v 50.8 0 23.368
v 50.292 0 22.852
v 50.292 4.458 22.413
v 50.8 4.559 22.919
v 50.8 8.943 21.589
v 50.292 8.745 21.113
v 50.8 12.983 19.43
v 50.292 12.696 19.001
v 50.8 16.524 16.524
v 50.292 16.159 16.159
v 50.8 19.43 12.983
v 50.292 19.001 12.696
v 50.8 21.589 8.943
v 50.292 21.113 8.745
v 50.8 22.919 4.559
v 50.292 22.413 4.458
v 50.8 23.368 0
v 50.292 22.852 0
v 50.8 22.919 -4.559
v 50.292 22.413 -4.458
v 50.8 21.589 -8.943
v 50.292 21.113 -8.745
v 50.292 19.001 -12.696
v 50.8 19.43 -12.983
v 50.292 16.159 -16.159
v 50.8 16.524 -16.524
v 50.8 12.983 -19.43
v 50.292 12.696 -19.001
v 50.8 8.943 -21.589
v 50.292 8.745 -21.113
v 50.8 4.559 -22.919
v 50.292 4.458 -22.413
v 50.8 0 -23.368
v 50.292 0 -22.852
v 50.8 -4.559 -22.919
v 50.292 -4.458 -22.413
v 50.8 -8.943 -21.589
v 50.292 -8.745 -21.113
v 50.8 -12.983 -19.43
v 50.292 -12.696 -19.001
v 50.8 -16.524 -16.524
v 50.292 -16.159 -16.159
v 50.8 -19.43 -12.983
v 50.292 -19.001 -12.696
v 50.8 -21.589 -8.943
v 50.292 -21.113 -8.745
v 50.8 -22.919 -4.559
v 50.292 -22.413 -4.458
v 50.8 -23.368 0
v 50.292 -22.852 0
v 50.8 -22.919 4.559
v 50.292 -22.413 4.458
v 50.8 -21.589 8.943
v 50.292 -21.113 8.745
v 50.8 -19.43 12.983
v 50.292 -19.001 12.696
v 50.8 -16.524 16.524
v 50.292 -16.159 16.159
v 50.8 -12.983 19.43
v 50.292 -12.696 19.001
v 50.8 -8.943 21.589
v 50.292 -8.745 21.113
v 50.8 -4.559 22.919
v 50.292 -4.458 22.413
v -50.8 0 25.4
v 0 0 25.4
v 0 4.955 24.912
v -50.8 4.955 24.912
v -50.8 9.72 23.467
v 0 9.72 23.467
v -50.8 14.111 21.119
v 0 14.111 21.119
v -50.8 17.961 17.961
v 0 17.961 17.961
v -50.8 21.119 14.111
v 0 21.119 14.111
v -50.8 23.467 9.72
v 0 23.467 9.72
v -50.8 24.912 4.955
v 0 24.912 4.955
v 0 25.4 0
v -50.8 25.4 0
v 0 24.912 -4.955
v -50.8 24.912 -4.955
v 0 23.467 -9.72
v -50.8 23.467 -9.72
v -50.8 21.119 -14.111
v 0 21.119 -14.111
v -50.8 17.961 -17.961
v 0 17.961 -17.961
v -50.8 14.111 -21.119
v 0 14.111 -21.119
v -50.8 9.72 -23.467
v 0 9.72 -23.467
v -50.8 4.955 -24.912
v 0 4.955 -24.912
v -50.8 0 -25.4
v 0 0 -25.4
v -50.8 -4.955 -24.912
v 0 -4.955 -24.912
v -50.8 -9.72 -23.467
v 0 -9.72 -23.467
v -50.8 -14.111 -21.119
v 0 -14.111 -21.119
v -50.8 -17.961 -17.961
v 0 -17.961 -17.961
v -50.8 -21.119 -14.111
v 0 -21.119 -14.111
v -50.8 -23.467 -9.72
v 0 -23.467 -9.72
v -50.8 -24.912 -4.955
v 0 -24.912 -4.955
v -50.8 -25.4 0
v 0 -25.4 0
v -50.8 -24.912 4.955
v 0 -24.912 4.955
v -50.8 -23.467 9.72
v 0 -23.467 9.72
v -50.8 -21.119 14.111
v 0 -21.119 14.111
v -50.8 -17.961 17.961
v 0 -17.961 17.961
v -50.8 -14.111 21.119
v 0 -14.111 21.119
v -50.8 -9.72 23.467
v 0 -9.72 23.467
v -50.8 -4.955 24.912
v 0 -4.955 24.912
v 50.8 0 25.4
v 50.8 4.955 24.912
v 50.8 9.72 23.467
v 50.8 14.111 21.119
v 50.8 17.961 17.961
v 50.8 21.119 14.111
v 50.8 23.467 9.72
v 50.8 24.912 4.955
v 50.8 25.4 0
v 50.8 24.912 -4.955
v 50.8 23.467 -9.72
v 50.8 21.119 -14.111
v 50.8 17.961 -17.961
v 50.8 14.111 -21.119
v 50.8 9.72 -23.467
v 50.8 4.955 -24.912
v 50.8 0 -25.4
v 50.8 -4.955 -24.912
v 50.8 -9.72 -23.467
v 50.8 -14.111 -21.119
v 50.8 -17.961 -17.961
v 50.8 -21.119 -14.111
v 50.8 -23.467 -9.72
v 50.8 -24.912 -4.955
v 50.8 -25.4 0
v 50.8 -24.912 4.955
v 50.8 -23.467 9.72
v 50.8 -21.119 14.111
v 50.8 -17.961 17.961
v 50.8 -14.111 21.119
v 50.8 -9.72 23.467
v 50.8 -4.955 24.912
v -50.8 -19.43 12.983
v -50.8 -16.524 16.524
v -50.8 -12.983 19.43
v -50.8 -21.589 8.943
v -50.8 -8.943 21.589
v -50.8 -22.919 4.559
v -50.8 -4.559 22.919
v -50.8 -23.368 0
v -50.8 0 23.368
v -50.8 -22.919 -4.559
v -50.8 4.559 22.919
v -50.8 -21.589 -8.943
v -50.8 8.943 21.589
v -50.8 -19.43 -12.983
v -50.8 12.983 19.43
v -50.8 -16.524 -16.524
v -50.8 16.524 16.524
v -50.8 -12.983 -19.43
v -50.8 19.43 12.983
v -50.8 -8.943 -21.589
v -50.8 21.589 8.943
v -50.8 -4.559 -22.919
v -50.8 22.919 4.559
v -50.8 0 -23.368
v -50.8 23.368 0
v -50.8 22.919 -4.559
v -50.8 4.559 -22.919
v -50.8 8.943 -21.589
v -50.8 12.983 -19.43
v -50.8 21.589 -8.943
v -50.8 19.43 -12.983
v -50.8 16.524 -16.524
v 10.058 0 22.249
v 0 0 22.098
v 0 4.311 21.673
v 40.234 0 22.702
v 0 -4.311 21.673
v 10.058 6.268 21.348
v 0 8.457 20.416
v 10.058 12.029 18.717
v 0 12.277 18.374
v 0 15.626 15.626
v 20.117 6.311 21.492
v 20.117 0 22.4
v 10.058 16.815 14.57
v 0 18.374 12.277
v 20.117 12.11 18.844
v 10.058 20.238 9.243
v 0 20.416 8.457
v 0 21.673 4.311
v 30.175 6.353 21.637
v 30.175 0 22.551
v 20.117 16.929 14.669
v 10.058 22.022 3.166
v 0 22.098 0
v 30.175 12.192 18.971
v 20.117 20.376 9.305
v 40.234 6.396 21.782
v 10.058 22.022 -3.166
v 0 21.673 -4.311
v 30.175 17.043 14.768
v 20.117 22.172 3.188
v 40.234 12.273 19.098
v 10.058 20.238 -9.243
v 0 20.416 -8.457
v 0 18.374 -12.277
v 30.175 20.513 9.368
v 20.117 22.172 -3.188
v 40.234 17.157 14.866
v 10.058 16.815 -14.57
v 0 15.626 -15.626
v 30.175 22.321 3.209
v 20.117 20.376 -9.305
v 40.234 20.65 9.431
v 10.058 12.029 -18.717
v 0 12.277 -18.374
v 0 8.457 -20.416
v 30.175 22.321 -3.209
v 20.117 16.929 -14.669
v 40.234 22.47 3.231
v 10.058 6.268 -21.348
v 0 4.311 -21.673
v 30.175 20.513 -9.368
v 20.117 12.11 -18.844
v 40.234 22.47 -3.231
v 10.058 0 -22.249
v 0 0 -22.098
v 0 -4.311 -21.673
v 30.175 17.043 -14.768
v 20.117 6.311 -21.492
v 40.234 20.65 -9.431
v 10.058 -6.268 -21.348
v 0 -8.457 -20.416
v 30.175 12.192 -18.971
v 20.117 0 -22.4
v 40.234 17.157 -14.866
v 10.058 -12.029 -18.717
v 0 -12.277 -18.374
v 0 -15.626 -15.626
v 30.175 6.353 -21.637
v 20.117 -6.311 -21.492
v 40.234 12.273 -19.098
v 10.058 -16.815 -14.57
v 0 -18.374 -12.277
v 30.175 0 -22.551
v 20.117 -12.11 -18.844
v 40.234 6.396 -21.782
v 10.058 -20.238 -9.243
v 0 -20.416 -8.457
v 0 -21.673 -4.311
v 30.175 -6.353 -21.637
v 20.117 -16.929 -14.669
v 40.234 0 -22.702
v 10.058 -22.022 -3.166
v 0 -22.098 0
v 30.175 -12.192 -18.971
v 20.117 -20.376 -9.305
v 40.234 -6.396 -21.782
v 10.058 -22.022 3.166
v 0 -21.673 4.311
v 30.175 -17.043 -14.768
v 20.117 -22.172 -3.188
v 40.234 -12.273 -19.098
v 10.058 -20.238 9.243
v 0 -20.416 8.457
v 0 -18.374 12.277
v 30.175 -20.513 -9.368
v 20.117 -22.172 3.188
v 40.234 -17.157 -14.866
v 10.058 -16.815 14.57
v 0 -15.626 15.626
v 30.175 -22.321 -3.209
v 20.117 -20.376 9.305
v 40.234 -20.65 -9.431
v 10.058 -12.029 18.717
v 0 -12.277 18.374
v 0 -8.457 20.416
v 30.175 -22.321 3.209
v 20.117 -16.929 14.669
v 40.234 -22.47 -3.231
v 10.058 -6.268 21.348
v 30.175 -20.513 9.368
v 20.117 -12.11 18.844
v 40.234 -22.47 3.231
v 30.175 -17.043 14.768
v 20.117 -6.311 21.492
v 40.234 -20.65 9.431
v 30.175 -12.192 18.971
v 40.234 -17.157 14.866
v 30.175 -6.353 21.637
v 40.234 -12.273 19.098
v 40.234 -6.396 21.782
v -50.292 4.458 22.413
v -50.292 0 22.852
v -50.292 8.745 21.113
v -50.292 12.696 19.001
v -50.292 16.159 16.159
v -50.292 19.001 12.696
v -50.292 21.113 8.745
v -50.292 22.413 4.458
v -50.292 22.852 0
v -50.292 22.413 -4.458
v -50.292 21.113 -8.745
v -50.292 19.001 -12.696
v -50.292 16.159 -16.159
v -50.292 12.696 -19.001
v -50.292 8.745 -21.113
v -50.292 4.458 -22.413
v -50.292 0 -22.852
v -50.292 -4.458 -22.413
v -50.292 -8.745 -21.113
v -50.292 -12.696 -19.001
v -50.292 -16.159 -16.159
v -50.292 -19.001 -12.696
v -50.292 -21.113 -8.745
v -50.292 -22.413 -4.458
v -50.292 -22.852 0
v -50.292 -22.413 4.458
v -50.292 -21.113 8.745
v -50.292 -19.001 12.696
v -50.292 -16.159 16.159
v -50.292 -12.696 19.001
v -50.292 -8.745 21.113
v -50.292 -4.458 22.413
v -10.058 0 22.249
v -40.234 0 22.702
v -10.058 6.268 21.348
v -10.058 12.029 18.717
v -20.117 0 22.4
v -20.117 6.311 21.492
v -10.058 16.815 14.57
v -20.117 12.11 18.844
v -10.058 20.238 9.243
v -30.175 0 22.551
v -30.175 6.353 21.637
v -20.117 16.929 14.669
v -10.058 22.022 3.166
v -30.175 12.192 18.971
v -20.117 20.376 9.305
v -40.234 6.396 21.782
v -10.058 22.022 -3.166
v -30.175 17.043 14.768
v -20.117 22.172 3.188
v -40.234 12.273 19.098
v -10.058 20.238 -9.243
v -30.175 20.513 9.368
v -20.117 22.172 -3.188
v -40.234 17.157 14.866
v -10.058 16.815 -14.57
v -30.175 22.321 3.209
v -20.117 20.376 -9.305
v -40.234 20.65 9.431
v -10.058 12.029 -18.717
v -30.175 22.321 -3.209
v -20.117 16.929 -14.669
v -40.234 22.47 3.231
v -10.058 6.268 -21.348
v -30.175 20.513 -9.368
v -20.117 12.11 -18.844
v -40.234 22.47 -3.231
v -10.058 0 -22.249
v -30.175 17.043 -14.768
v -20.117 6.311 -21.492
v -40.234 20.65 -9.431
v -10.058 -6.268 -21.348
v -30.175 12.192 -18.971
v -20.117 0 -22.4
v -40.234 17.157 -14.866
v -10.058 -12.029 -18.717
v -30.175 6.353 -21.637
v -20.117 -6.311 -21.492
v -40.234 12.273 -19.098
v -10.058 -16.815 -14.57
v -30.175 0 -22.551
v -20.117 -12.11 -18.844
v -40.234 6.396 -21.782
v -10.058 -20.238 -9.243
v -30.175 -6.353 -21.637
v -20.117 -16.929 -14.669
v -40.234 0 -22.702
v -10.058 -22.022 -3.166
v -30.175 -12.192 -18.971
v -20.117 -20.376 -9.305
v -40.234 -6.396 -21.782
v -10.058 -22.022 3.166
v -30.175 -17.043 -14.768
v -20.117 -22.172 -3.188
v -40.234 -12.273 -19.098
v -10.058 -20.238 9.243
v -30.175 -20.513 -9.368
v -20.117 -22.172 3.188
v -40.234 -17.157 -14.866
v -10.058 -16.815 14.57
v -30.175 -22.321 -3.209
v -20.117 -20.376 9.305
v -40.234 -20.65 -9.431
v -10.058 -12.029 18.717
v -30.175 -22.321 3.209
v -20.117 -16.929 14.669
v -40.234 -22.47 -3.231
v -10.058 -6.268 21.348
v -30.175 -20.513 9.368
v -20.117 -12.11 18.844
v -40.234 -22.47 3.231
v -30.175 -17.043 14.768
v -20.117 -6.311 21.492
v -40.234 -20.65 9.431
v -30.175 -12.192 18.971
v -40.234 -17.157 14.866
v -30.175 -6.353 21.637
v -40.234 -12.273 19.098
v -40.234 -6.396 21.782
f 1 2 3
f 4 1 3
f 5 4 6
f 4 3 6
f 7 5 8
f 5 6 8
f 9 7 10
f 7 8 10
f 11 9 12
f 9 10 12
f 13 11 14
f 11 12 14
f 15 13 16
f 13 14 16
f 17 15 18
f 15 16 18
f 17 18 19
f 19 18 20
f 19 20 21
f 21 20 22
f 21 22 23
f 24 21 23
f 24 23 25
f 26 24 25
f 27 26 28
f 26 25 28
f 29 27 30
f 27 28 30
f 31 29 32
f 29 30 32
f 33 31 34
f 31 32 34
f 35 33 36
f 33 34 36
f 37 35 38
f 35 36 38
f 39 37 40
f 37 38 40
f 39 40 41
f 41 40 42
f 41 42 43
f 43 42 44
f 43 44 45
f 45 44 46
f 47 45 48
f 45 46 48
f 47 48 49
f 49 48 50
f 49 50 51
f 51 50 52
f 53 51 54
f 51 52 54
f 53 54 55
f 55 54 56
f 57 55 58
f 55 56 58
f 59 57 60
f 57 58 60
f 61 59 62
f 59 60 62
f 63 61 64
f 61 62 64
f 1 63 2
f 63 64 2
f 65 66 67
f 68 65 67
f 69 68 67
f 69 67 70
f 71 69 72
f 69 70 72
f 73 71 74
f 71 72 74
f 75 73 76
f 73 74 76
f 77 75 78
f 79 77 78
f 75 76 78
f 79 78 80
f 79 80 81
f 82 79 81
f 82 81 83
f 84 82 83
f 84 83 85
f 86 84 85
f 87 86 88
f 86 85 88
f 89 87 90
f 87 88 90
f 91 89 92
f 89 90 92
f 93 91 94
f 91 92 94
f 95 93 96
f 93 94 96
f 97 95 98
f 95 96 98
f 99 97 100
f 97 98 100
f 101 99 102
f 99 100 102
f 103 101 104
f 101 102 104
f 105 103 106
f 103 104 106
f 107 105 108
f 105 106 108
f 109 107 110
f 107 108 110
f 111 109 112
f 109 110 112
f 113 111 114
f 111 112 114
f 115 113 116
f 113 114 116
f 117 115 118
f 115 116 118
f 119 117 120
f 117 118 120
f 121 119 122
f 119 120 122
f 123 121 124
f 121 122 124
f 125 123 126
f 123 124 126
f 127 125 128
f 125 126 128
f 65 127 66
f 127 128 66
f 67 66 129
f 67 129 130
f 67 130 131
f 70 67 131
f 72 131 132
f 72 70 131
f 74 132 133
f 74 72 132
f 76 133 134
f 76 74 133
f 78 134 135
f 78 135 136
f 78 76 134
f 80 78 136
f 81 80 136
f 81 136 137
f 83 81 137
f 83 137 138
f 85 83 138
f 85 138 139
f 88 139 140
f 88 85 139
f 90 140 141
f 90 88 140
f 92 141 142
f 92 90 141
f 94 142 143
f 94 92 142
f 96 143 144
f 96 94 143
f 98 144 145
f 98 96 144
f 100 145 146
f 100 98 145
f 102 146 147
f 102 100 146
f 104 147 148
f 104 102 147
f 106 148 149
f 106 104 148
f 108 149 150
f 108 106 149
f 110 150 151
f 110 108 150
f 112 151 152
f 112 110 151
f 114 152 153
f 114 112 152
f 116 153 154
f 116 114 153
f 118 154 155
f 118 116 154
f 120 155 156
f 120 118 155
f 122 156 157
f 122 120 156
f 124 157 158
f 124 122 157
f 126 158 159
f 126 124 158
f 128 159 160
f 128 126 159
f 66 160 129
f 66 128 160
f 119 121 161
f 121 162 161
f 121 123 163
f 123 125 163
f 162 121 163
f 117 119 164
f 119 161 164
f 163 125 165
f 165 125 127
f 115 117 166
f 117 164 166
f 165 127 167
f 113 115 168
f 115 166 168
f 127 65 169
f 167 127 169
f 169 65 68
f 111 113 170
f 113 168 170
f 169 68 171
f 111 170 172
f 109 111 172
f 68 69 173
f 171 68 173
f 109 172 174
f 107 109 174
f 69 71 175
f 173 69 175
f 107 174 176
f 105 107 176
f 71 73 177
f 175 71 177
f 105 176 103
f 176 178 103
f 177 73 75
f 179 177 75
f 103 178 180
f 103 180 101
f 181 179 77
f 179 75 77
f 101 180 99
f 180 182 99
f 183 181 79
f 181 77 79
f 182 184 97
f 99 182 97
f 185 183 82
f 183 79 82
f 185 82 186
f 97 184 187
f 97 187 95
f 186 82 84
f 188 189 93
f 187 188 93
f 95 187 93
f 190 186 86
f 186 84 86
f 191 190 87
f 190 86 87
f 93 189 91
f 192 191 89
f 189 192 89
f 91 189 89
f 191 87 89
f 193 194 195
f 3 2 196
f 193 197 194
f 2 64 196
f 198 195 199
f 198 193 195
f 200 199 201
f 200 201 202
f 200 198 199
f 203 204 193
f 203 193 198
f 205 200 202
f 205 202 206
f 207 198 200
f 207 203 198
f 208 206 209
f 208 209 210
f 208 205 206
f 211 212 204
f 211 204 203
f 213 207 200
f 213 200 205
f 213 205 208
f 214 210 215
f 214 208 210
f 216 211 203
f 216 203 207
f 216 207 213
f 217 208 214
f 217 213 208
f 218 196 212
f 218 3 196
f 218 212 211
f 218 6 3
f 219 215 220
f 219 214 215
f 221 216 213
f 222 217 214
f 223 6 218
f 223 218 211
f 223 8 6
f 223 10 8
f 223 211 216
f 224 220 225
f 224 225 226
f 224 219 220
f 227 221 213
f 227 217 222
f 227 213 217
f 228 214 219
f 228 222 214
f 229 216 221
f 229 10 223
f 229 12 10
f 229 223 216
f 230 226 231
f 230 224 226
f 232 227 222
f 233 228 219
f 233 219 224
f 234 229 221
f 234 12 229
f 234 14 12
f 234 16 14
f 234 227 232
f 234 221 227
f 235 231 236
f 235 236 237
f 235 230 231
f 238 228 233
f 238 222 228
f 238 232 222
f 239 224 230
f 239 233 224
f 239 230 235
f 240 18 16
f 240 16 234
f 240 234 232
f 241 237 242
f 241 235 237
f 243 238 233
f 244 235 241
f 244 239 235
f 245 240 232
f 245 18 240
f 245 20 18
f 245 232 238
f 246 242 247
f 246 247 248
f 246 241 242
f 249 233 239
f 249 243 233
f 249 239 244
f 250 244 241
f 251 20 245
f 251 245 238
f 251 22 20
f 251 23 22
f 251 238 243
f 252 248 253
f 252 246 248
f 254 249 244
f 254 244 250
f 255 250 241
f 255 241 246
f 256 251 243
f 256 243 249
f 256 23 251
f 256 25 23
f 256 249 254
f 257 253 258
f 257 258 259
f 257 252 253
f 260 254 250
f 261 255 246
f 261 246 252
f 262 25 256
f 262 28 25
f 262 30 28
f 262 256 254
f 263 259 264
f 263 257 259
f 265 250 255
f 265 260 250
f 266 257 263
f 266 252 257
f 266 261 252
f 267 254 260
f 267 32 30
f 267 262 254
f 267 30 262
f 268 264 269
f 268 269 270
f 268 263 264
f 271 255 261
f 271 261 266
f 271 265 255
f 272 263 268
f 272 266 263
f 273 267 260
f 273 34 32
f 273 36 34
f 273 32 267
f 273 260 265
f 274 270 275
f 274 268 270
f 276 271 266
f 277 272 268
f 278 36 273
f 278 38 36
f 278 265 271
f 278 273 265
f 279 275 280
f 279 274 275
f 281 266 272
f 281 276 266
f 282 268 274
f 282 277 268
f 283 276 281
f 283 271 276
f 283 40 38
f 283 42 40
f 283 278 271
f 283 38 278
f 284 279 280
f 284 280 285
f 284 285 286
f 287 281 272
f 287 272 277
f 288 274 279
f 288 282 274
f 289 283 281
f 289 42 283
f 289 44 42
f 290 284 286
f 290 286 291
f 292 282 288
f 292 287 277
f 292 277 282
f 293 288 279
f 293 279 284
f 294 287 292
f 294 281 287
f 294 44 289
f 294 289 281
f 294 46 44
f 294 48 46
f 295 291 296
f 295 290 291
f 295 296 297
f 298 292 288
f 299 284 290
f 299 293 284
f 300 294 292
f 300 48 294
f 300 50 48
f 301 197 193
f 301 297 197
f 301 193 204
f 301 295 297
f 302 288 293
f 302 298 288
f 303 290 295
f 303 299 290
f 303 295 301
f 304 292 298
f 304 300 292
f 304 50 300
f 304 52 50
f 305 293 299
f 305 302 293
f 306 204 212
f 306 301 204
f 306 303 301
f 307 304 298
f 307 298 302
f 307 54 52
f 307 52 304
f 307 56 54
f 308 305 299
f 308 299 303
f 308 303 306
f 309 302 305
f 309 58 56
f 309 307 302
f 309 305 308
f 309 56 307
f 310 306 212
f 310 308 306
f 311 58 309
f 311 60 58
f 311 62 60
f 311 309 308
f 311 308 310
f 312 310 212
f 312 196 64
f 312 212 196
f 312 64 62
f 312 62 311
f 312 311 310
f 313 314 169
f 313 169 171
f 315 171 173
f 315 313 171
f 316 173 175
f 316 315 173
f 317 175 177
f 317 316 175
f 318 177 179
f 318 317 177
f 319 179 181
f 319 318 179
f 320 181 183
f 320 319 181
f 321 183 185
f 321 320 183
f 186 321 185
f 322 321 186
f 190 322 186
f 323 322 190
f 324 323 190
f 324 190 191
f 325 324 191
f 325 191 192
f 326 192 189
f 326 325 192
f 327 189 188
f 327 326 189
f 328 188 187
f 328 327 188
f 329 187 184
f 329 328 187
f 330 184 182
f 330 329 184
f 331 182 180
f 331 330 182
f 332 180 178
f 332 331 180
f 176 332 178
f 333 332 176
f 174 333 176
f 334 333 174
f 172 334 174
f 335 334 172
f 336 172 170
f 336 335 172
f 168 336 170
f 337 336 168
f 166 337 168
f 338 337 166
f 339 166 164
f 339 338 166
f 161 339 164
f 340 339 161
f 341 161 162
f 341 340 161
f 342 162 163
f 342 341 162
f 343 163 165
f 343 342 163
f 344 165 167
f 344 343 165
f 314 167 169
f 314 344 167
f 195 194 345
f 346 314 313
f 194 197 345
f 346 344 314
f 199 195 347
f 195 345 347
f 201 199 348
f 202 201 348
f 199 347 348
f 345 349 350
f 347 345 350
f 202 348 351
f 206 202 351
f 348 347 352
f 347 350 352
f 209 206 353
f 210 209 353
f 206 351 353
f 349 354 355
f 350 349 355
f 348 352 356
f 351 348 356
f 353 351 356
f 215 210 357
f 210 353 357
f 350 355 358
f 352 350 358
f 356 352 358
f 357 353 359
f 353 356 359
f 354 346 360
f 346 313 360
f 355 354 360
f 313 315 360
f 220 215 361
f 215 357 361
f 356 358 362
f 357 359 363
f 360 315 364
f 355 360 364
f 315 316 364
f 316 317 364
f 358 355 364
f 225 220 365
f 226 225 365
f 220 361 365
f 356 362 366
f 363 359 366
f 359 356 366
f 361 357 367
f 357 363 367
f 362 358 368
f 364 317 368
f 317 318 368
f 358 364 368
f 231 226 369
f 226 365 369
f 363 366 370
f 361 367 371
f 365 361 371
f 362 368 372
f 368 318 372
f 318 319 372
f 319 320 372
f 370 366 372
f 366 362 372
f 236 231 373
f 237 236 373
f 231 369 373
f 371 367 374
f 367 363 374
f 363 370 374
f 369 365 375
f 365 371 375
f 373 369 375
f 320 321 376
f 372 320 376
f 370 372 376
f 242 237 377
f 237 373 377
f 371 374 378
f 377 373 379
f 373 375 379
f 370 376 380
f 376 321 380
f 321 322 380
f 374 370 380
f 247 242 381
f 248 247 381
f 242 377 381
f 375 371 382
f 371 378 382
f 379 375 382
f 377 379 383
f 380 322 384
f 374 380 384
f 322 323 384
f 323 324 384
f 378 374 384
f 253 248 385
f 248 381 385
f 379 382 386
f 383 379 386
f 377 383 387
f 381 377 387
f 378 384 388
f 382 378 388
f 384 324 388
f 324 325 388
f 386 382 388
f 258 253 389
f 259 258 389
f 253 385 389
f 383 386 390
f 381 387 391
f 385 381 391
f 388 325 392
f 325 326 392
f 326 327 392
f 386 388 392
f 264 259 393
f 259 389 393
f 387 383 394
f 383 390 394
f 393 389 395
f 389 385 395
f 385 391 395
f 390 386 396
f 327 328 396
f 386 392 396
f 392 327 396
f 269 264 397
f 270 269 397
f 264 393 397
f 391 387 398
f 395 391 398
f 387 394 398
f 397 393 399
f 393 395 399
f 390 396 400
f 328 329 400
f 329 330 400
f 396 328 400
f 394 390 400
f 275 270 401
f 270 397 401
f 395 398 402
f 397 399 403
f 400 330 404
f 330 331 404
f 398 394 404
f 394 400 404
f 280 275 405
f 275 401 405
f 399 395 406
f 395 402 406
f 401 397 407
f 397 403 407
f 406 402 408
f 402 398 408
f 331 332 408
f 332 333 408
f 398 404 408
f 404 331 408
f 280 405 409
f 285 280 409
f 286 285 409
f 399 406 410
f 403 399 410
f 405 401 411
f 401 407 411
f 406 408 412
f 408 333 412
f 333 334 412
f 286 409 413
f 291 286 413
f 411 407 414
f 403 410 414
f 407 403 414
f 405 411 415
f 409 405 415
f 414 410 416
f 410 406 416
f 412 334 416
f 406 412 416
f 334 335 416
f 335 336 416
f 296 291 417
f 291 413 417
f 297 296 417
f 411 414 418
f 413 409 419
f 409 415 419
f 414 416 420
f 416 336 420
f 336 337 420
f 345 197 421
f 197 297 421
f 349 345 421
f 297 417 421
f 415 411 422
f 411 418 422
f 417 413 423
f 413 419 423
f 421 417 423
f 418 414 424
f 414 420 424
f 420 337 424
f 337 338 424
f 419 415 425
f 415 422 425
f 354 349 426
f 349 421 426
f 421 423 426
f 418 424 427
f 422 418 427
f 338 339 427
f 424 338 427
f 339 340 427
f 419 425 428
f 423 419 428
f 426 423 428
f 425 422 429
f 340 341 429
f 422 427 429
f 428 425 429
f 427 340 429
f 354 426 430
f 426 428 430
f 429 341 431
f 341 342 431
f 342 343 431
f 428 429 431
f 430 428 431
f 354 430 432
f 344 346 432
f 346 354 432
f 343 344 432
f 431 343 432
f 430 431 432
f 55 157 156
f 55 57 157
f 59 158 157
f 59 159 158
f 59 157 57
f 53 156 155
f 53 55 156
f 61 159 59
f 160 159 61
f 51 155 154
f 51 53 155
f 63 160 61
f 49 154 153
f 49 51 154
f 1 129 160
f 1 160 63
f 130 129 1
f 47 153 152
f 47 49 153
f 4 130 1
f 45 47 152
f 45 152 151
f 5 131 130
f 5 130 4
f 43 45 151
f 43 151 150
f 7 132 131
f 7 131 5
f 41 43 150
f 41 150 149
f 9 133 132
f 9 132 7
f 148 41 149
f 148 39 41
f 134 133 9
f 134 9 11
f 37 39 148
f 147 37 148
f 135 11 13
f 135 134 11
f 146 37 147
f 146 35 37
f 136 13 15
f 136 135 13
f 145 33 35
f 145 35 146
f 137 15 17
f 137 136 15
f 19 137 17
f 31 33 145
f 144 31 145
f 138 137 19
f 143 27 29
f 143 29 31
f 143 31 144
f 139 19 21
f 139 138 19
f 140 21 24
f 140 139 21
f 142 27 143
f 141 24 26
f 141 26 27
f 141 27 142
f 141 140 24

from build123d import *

# Parameters (mm, degrees)
F3_SIZE = 0.508


with BuildPart() as f1:
    # F0 (on Front) → F1 (revolve)
    with BuildSketch(Plane.XZ):
        Polygon((50.8, 25.4), (0, 25.4), (0, 22.098), (50.8, 22.86), align=None)
    revolve(axis=Axis((-51.9470935156, 0, 0), (-1, 0, 0)))

    # F2: F1 across face


with BuildPart() as f1_1:
    add(f1.part)
    add(f1.part.mirror(Plane(origin=(0, 0, 0), x_dir=(0, -1, 0), z_dir=(-1, 0, 0))))

    # F3
    f3_edges = [f1_1.edges().sort_by_distance(p)[0] for p in [
        (-50.8, 0, -22.86),
        (50.8, 0, -22.86),
    ]]
    chamfer(f3_edges, length=F3_SIZE)


solid = f1_1.part
